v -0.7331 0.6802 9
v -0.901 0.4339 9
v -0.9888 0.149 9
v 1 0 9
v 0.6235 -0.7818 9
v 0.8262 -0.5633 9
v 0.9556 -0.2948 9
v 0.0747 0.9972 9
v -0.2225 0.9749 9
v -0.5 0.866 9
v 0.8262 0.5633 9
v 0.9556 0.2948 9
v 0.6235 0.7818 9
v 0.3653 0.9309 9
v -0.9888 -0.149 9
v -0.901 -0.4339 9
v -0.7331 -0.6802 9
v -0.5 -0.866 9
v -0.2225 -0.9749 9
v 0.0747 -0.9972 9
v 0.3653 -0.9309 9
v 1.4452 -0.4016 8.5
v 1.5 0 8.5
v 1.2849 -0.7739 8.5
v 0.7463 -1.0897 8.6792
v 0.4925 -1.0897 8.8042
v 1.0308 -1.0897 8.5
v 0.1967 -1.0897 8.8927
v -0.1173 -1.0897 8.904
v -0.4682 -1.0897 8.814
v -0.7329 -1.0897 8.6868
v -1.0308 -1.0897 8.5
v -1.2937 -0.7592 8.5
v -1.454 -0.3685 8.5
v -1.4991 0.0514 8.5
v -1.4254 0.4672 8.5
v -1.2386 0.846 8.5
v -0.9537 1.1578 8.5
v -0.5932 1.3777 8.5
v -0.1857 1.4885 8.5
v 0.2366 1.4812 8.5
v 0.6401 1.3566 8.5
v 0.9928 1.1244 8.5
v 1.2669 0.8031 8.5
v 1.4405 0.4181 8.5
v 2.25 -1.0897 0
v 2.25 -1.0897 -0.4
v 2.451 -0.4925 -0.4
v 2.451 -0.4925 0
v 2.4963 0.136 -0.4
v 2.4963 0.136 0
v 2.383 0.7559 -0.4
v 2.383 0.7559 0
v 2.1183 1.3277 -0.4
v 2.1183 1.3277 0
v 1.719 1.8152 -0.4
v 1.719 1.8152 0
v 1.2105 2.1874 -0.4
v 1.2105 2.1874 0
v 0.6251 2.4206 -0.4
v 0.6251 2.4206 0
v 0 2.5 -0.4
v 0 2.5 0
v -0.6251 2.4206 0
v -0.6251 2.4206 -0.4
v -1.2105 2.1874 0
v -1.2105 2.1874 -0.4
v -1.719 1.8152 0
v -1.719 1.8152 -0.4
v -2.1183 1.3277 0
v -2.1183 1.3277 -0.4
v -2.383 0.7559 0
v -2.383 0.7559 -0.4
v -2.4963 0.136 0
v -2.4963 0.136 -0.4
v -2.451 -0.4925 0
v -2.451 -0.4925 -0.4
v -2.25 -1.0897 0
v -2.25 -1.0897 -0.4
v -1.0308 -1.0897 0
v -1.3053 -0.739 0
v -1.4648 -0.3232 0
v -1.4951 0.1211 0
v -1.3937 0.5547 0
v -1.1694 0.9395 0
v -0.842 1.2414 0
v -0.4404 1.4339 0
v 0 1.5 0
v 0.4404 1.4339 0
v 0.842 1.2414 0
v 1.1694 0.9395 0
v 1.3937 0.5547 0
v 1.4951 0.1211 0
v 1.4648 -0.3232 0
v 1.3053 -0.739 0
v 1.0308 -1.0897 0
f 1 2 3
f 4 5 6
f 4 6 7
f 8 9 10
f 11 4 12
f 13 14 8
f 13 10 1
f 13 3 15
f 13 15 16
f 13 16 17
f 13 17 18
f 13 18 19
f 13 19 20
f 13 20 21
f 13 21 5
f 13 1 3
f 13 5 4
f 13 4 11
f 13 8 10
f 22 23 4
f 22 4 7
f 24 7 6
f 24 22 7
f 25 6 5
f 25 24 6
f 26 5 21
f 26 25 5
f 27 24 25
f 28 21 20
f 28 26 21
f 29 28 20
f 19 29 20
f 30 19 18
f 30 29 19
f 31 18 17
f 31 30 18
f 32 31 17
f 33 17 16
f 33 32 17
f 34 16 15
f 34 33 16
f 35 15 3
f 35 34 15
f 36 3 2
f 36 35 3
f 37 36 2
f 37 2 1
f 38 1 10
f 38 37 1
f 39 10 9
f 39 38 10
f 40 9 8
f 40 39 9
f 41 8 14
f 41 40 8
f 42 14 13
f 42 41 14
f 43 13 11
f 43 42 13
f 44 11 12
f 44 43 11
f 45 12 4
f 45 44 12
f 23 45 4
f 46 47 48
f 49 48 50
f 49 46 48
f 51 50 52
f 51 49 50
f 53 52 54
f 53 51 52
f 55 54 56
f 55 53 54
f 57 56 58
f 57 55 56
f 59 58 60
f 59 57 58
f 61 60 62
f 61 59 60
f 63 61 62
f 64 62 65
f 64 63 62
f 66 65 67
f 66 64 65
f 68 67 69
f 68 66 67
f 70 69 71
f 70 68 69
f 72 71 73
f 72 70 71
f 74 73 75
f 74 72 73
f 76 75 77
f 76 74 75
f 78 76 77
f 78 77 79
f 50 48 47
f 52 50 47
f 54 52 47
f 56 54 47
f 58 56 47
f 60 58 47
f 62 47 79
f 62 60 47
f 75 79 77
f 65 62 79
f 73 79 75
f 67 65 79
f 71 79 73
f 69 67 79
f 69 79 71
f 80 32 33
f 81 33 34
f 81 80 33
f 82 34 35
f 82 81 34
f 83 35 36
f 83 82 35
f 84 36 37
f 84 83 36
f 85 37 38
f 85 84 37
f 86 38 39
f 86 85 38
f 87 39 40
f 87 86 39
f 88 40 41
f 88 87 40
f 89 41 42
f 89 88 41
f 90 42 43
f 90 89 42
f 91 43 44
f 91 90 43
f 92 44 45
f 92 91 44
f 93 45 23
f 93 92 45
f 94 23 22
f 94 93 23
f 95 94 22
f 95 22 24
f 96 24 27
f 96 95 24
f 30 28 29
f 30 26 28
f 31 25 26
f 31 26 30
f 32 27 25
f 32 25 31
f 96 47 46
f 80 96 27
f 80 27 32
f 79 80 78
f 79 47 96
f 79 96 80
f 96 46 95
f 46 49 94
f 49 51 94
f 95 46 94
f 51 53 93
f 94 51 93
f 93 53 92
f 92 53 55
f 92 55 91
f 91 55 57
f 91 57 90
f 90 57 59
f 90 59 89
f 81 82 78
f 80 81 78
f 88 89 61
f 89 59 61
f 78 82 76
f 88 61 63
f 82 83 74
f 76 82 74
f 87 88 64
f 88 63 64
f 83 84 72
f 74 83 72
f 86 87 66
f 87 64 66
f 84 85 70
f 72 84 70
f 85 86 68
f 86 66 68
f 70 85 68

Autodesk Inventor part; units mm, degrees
ref_plane "YZ Plane" through (0, 0, 0) normal (1, 0, 0) x (0, 1, 0)
ref_plane "XZ Plane" through (0, 0, 0) normal (0, 1, 0) x (-1, 0, 0)
ref_plane "XY Plane" through (0, 0, 0) normal (0, 0, 1) x (1, 0, 0)
sketch "Sketch1" plane through (0, 0, 0) normal (0, 0, 1) x (1, 0, 0)
  circle A0 centre (0, 0) radius 1.5
  dimension "d0" = 3
extrude "Extrusion1" add sketch "Sketch1" along normal blind 9
sketch "Sketch2" plane through (0, 0, 0) normal (0, 0, -1) x (-1, 0, 0)
  circle A0 centre (0, 0) radius 1.5 construction
  circle A1 centre (0, 0) radius 2.5
  dimension "d3" = 5
extrude "Extrusion2" add sketch "Sketch2" along normal blind 0.4
chamfer "Chamfer1" distance 0.5 angle 45 1 edges at (-1.5, 0, 9)
sketch "Sketch3" plane through (0, 0, -0.4) normal (0, 0, -1) x (-1, 0, 0)
  circle A0 centre (0, 0) radius 1.5 construction
  circle A1 centre (0, 0) radius 2.5 projected
  line L0 (-2.25, -1.0897) -> (2.25, -1.0897)
  dimension "d9" = 4.5
extrude "Extrusion3" cut sketch "Sketch3" against normal through all contours L0 A1 picked at (-0.1034, -1.5534)
properties part number "Spring_pin"
